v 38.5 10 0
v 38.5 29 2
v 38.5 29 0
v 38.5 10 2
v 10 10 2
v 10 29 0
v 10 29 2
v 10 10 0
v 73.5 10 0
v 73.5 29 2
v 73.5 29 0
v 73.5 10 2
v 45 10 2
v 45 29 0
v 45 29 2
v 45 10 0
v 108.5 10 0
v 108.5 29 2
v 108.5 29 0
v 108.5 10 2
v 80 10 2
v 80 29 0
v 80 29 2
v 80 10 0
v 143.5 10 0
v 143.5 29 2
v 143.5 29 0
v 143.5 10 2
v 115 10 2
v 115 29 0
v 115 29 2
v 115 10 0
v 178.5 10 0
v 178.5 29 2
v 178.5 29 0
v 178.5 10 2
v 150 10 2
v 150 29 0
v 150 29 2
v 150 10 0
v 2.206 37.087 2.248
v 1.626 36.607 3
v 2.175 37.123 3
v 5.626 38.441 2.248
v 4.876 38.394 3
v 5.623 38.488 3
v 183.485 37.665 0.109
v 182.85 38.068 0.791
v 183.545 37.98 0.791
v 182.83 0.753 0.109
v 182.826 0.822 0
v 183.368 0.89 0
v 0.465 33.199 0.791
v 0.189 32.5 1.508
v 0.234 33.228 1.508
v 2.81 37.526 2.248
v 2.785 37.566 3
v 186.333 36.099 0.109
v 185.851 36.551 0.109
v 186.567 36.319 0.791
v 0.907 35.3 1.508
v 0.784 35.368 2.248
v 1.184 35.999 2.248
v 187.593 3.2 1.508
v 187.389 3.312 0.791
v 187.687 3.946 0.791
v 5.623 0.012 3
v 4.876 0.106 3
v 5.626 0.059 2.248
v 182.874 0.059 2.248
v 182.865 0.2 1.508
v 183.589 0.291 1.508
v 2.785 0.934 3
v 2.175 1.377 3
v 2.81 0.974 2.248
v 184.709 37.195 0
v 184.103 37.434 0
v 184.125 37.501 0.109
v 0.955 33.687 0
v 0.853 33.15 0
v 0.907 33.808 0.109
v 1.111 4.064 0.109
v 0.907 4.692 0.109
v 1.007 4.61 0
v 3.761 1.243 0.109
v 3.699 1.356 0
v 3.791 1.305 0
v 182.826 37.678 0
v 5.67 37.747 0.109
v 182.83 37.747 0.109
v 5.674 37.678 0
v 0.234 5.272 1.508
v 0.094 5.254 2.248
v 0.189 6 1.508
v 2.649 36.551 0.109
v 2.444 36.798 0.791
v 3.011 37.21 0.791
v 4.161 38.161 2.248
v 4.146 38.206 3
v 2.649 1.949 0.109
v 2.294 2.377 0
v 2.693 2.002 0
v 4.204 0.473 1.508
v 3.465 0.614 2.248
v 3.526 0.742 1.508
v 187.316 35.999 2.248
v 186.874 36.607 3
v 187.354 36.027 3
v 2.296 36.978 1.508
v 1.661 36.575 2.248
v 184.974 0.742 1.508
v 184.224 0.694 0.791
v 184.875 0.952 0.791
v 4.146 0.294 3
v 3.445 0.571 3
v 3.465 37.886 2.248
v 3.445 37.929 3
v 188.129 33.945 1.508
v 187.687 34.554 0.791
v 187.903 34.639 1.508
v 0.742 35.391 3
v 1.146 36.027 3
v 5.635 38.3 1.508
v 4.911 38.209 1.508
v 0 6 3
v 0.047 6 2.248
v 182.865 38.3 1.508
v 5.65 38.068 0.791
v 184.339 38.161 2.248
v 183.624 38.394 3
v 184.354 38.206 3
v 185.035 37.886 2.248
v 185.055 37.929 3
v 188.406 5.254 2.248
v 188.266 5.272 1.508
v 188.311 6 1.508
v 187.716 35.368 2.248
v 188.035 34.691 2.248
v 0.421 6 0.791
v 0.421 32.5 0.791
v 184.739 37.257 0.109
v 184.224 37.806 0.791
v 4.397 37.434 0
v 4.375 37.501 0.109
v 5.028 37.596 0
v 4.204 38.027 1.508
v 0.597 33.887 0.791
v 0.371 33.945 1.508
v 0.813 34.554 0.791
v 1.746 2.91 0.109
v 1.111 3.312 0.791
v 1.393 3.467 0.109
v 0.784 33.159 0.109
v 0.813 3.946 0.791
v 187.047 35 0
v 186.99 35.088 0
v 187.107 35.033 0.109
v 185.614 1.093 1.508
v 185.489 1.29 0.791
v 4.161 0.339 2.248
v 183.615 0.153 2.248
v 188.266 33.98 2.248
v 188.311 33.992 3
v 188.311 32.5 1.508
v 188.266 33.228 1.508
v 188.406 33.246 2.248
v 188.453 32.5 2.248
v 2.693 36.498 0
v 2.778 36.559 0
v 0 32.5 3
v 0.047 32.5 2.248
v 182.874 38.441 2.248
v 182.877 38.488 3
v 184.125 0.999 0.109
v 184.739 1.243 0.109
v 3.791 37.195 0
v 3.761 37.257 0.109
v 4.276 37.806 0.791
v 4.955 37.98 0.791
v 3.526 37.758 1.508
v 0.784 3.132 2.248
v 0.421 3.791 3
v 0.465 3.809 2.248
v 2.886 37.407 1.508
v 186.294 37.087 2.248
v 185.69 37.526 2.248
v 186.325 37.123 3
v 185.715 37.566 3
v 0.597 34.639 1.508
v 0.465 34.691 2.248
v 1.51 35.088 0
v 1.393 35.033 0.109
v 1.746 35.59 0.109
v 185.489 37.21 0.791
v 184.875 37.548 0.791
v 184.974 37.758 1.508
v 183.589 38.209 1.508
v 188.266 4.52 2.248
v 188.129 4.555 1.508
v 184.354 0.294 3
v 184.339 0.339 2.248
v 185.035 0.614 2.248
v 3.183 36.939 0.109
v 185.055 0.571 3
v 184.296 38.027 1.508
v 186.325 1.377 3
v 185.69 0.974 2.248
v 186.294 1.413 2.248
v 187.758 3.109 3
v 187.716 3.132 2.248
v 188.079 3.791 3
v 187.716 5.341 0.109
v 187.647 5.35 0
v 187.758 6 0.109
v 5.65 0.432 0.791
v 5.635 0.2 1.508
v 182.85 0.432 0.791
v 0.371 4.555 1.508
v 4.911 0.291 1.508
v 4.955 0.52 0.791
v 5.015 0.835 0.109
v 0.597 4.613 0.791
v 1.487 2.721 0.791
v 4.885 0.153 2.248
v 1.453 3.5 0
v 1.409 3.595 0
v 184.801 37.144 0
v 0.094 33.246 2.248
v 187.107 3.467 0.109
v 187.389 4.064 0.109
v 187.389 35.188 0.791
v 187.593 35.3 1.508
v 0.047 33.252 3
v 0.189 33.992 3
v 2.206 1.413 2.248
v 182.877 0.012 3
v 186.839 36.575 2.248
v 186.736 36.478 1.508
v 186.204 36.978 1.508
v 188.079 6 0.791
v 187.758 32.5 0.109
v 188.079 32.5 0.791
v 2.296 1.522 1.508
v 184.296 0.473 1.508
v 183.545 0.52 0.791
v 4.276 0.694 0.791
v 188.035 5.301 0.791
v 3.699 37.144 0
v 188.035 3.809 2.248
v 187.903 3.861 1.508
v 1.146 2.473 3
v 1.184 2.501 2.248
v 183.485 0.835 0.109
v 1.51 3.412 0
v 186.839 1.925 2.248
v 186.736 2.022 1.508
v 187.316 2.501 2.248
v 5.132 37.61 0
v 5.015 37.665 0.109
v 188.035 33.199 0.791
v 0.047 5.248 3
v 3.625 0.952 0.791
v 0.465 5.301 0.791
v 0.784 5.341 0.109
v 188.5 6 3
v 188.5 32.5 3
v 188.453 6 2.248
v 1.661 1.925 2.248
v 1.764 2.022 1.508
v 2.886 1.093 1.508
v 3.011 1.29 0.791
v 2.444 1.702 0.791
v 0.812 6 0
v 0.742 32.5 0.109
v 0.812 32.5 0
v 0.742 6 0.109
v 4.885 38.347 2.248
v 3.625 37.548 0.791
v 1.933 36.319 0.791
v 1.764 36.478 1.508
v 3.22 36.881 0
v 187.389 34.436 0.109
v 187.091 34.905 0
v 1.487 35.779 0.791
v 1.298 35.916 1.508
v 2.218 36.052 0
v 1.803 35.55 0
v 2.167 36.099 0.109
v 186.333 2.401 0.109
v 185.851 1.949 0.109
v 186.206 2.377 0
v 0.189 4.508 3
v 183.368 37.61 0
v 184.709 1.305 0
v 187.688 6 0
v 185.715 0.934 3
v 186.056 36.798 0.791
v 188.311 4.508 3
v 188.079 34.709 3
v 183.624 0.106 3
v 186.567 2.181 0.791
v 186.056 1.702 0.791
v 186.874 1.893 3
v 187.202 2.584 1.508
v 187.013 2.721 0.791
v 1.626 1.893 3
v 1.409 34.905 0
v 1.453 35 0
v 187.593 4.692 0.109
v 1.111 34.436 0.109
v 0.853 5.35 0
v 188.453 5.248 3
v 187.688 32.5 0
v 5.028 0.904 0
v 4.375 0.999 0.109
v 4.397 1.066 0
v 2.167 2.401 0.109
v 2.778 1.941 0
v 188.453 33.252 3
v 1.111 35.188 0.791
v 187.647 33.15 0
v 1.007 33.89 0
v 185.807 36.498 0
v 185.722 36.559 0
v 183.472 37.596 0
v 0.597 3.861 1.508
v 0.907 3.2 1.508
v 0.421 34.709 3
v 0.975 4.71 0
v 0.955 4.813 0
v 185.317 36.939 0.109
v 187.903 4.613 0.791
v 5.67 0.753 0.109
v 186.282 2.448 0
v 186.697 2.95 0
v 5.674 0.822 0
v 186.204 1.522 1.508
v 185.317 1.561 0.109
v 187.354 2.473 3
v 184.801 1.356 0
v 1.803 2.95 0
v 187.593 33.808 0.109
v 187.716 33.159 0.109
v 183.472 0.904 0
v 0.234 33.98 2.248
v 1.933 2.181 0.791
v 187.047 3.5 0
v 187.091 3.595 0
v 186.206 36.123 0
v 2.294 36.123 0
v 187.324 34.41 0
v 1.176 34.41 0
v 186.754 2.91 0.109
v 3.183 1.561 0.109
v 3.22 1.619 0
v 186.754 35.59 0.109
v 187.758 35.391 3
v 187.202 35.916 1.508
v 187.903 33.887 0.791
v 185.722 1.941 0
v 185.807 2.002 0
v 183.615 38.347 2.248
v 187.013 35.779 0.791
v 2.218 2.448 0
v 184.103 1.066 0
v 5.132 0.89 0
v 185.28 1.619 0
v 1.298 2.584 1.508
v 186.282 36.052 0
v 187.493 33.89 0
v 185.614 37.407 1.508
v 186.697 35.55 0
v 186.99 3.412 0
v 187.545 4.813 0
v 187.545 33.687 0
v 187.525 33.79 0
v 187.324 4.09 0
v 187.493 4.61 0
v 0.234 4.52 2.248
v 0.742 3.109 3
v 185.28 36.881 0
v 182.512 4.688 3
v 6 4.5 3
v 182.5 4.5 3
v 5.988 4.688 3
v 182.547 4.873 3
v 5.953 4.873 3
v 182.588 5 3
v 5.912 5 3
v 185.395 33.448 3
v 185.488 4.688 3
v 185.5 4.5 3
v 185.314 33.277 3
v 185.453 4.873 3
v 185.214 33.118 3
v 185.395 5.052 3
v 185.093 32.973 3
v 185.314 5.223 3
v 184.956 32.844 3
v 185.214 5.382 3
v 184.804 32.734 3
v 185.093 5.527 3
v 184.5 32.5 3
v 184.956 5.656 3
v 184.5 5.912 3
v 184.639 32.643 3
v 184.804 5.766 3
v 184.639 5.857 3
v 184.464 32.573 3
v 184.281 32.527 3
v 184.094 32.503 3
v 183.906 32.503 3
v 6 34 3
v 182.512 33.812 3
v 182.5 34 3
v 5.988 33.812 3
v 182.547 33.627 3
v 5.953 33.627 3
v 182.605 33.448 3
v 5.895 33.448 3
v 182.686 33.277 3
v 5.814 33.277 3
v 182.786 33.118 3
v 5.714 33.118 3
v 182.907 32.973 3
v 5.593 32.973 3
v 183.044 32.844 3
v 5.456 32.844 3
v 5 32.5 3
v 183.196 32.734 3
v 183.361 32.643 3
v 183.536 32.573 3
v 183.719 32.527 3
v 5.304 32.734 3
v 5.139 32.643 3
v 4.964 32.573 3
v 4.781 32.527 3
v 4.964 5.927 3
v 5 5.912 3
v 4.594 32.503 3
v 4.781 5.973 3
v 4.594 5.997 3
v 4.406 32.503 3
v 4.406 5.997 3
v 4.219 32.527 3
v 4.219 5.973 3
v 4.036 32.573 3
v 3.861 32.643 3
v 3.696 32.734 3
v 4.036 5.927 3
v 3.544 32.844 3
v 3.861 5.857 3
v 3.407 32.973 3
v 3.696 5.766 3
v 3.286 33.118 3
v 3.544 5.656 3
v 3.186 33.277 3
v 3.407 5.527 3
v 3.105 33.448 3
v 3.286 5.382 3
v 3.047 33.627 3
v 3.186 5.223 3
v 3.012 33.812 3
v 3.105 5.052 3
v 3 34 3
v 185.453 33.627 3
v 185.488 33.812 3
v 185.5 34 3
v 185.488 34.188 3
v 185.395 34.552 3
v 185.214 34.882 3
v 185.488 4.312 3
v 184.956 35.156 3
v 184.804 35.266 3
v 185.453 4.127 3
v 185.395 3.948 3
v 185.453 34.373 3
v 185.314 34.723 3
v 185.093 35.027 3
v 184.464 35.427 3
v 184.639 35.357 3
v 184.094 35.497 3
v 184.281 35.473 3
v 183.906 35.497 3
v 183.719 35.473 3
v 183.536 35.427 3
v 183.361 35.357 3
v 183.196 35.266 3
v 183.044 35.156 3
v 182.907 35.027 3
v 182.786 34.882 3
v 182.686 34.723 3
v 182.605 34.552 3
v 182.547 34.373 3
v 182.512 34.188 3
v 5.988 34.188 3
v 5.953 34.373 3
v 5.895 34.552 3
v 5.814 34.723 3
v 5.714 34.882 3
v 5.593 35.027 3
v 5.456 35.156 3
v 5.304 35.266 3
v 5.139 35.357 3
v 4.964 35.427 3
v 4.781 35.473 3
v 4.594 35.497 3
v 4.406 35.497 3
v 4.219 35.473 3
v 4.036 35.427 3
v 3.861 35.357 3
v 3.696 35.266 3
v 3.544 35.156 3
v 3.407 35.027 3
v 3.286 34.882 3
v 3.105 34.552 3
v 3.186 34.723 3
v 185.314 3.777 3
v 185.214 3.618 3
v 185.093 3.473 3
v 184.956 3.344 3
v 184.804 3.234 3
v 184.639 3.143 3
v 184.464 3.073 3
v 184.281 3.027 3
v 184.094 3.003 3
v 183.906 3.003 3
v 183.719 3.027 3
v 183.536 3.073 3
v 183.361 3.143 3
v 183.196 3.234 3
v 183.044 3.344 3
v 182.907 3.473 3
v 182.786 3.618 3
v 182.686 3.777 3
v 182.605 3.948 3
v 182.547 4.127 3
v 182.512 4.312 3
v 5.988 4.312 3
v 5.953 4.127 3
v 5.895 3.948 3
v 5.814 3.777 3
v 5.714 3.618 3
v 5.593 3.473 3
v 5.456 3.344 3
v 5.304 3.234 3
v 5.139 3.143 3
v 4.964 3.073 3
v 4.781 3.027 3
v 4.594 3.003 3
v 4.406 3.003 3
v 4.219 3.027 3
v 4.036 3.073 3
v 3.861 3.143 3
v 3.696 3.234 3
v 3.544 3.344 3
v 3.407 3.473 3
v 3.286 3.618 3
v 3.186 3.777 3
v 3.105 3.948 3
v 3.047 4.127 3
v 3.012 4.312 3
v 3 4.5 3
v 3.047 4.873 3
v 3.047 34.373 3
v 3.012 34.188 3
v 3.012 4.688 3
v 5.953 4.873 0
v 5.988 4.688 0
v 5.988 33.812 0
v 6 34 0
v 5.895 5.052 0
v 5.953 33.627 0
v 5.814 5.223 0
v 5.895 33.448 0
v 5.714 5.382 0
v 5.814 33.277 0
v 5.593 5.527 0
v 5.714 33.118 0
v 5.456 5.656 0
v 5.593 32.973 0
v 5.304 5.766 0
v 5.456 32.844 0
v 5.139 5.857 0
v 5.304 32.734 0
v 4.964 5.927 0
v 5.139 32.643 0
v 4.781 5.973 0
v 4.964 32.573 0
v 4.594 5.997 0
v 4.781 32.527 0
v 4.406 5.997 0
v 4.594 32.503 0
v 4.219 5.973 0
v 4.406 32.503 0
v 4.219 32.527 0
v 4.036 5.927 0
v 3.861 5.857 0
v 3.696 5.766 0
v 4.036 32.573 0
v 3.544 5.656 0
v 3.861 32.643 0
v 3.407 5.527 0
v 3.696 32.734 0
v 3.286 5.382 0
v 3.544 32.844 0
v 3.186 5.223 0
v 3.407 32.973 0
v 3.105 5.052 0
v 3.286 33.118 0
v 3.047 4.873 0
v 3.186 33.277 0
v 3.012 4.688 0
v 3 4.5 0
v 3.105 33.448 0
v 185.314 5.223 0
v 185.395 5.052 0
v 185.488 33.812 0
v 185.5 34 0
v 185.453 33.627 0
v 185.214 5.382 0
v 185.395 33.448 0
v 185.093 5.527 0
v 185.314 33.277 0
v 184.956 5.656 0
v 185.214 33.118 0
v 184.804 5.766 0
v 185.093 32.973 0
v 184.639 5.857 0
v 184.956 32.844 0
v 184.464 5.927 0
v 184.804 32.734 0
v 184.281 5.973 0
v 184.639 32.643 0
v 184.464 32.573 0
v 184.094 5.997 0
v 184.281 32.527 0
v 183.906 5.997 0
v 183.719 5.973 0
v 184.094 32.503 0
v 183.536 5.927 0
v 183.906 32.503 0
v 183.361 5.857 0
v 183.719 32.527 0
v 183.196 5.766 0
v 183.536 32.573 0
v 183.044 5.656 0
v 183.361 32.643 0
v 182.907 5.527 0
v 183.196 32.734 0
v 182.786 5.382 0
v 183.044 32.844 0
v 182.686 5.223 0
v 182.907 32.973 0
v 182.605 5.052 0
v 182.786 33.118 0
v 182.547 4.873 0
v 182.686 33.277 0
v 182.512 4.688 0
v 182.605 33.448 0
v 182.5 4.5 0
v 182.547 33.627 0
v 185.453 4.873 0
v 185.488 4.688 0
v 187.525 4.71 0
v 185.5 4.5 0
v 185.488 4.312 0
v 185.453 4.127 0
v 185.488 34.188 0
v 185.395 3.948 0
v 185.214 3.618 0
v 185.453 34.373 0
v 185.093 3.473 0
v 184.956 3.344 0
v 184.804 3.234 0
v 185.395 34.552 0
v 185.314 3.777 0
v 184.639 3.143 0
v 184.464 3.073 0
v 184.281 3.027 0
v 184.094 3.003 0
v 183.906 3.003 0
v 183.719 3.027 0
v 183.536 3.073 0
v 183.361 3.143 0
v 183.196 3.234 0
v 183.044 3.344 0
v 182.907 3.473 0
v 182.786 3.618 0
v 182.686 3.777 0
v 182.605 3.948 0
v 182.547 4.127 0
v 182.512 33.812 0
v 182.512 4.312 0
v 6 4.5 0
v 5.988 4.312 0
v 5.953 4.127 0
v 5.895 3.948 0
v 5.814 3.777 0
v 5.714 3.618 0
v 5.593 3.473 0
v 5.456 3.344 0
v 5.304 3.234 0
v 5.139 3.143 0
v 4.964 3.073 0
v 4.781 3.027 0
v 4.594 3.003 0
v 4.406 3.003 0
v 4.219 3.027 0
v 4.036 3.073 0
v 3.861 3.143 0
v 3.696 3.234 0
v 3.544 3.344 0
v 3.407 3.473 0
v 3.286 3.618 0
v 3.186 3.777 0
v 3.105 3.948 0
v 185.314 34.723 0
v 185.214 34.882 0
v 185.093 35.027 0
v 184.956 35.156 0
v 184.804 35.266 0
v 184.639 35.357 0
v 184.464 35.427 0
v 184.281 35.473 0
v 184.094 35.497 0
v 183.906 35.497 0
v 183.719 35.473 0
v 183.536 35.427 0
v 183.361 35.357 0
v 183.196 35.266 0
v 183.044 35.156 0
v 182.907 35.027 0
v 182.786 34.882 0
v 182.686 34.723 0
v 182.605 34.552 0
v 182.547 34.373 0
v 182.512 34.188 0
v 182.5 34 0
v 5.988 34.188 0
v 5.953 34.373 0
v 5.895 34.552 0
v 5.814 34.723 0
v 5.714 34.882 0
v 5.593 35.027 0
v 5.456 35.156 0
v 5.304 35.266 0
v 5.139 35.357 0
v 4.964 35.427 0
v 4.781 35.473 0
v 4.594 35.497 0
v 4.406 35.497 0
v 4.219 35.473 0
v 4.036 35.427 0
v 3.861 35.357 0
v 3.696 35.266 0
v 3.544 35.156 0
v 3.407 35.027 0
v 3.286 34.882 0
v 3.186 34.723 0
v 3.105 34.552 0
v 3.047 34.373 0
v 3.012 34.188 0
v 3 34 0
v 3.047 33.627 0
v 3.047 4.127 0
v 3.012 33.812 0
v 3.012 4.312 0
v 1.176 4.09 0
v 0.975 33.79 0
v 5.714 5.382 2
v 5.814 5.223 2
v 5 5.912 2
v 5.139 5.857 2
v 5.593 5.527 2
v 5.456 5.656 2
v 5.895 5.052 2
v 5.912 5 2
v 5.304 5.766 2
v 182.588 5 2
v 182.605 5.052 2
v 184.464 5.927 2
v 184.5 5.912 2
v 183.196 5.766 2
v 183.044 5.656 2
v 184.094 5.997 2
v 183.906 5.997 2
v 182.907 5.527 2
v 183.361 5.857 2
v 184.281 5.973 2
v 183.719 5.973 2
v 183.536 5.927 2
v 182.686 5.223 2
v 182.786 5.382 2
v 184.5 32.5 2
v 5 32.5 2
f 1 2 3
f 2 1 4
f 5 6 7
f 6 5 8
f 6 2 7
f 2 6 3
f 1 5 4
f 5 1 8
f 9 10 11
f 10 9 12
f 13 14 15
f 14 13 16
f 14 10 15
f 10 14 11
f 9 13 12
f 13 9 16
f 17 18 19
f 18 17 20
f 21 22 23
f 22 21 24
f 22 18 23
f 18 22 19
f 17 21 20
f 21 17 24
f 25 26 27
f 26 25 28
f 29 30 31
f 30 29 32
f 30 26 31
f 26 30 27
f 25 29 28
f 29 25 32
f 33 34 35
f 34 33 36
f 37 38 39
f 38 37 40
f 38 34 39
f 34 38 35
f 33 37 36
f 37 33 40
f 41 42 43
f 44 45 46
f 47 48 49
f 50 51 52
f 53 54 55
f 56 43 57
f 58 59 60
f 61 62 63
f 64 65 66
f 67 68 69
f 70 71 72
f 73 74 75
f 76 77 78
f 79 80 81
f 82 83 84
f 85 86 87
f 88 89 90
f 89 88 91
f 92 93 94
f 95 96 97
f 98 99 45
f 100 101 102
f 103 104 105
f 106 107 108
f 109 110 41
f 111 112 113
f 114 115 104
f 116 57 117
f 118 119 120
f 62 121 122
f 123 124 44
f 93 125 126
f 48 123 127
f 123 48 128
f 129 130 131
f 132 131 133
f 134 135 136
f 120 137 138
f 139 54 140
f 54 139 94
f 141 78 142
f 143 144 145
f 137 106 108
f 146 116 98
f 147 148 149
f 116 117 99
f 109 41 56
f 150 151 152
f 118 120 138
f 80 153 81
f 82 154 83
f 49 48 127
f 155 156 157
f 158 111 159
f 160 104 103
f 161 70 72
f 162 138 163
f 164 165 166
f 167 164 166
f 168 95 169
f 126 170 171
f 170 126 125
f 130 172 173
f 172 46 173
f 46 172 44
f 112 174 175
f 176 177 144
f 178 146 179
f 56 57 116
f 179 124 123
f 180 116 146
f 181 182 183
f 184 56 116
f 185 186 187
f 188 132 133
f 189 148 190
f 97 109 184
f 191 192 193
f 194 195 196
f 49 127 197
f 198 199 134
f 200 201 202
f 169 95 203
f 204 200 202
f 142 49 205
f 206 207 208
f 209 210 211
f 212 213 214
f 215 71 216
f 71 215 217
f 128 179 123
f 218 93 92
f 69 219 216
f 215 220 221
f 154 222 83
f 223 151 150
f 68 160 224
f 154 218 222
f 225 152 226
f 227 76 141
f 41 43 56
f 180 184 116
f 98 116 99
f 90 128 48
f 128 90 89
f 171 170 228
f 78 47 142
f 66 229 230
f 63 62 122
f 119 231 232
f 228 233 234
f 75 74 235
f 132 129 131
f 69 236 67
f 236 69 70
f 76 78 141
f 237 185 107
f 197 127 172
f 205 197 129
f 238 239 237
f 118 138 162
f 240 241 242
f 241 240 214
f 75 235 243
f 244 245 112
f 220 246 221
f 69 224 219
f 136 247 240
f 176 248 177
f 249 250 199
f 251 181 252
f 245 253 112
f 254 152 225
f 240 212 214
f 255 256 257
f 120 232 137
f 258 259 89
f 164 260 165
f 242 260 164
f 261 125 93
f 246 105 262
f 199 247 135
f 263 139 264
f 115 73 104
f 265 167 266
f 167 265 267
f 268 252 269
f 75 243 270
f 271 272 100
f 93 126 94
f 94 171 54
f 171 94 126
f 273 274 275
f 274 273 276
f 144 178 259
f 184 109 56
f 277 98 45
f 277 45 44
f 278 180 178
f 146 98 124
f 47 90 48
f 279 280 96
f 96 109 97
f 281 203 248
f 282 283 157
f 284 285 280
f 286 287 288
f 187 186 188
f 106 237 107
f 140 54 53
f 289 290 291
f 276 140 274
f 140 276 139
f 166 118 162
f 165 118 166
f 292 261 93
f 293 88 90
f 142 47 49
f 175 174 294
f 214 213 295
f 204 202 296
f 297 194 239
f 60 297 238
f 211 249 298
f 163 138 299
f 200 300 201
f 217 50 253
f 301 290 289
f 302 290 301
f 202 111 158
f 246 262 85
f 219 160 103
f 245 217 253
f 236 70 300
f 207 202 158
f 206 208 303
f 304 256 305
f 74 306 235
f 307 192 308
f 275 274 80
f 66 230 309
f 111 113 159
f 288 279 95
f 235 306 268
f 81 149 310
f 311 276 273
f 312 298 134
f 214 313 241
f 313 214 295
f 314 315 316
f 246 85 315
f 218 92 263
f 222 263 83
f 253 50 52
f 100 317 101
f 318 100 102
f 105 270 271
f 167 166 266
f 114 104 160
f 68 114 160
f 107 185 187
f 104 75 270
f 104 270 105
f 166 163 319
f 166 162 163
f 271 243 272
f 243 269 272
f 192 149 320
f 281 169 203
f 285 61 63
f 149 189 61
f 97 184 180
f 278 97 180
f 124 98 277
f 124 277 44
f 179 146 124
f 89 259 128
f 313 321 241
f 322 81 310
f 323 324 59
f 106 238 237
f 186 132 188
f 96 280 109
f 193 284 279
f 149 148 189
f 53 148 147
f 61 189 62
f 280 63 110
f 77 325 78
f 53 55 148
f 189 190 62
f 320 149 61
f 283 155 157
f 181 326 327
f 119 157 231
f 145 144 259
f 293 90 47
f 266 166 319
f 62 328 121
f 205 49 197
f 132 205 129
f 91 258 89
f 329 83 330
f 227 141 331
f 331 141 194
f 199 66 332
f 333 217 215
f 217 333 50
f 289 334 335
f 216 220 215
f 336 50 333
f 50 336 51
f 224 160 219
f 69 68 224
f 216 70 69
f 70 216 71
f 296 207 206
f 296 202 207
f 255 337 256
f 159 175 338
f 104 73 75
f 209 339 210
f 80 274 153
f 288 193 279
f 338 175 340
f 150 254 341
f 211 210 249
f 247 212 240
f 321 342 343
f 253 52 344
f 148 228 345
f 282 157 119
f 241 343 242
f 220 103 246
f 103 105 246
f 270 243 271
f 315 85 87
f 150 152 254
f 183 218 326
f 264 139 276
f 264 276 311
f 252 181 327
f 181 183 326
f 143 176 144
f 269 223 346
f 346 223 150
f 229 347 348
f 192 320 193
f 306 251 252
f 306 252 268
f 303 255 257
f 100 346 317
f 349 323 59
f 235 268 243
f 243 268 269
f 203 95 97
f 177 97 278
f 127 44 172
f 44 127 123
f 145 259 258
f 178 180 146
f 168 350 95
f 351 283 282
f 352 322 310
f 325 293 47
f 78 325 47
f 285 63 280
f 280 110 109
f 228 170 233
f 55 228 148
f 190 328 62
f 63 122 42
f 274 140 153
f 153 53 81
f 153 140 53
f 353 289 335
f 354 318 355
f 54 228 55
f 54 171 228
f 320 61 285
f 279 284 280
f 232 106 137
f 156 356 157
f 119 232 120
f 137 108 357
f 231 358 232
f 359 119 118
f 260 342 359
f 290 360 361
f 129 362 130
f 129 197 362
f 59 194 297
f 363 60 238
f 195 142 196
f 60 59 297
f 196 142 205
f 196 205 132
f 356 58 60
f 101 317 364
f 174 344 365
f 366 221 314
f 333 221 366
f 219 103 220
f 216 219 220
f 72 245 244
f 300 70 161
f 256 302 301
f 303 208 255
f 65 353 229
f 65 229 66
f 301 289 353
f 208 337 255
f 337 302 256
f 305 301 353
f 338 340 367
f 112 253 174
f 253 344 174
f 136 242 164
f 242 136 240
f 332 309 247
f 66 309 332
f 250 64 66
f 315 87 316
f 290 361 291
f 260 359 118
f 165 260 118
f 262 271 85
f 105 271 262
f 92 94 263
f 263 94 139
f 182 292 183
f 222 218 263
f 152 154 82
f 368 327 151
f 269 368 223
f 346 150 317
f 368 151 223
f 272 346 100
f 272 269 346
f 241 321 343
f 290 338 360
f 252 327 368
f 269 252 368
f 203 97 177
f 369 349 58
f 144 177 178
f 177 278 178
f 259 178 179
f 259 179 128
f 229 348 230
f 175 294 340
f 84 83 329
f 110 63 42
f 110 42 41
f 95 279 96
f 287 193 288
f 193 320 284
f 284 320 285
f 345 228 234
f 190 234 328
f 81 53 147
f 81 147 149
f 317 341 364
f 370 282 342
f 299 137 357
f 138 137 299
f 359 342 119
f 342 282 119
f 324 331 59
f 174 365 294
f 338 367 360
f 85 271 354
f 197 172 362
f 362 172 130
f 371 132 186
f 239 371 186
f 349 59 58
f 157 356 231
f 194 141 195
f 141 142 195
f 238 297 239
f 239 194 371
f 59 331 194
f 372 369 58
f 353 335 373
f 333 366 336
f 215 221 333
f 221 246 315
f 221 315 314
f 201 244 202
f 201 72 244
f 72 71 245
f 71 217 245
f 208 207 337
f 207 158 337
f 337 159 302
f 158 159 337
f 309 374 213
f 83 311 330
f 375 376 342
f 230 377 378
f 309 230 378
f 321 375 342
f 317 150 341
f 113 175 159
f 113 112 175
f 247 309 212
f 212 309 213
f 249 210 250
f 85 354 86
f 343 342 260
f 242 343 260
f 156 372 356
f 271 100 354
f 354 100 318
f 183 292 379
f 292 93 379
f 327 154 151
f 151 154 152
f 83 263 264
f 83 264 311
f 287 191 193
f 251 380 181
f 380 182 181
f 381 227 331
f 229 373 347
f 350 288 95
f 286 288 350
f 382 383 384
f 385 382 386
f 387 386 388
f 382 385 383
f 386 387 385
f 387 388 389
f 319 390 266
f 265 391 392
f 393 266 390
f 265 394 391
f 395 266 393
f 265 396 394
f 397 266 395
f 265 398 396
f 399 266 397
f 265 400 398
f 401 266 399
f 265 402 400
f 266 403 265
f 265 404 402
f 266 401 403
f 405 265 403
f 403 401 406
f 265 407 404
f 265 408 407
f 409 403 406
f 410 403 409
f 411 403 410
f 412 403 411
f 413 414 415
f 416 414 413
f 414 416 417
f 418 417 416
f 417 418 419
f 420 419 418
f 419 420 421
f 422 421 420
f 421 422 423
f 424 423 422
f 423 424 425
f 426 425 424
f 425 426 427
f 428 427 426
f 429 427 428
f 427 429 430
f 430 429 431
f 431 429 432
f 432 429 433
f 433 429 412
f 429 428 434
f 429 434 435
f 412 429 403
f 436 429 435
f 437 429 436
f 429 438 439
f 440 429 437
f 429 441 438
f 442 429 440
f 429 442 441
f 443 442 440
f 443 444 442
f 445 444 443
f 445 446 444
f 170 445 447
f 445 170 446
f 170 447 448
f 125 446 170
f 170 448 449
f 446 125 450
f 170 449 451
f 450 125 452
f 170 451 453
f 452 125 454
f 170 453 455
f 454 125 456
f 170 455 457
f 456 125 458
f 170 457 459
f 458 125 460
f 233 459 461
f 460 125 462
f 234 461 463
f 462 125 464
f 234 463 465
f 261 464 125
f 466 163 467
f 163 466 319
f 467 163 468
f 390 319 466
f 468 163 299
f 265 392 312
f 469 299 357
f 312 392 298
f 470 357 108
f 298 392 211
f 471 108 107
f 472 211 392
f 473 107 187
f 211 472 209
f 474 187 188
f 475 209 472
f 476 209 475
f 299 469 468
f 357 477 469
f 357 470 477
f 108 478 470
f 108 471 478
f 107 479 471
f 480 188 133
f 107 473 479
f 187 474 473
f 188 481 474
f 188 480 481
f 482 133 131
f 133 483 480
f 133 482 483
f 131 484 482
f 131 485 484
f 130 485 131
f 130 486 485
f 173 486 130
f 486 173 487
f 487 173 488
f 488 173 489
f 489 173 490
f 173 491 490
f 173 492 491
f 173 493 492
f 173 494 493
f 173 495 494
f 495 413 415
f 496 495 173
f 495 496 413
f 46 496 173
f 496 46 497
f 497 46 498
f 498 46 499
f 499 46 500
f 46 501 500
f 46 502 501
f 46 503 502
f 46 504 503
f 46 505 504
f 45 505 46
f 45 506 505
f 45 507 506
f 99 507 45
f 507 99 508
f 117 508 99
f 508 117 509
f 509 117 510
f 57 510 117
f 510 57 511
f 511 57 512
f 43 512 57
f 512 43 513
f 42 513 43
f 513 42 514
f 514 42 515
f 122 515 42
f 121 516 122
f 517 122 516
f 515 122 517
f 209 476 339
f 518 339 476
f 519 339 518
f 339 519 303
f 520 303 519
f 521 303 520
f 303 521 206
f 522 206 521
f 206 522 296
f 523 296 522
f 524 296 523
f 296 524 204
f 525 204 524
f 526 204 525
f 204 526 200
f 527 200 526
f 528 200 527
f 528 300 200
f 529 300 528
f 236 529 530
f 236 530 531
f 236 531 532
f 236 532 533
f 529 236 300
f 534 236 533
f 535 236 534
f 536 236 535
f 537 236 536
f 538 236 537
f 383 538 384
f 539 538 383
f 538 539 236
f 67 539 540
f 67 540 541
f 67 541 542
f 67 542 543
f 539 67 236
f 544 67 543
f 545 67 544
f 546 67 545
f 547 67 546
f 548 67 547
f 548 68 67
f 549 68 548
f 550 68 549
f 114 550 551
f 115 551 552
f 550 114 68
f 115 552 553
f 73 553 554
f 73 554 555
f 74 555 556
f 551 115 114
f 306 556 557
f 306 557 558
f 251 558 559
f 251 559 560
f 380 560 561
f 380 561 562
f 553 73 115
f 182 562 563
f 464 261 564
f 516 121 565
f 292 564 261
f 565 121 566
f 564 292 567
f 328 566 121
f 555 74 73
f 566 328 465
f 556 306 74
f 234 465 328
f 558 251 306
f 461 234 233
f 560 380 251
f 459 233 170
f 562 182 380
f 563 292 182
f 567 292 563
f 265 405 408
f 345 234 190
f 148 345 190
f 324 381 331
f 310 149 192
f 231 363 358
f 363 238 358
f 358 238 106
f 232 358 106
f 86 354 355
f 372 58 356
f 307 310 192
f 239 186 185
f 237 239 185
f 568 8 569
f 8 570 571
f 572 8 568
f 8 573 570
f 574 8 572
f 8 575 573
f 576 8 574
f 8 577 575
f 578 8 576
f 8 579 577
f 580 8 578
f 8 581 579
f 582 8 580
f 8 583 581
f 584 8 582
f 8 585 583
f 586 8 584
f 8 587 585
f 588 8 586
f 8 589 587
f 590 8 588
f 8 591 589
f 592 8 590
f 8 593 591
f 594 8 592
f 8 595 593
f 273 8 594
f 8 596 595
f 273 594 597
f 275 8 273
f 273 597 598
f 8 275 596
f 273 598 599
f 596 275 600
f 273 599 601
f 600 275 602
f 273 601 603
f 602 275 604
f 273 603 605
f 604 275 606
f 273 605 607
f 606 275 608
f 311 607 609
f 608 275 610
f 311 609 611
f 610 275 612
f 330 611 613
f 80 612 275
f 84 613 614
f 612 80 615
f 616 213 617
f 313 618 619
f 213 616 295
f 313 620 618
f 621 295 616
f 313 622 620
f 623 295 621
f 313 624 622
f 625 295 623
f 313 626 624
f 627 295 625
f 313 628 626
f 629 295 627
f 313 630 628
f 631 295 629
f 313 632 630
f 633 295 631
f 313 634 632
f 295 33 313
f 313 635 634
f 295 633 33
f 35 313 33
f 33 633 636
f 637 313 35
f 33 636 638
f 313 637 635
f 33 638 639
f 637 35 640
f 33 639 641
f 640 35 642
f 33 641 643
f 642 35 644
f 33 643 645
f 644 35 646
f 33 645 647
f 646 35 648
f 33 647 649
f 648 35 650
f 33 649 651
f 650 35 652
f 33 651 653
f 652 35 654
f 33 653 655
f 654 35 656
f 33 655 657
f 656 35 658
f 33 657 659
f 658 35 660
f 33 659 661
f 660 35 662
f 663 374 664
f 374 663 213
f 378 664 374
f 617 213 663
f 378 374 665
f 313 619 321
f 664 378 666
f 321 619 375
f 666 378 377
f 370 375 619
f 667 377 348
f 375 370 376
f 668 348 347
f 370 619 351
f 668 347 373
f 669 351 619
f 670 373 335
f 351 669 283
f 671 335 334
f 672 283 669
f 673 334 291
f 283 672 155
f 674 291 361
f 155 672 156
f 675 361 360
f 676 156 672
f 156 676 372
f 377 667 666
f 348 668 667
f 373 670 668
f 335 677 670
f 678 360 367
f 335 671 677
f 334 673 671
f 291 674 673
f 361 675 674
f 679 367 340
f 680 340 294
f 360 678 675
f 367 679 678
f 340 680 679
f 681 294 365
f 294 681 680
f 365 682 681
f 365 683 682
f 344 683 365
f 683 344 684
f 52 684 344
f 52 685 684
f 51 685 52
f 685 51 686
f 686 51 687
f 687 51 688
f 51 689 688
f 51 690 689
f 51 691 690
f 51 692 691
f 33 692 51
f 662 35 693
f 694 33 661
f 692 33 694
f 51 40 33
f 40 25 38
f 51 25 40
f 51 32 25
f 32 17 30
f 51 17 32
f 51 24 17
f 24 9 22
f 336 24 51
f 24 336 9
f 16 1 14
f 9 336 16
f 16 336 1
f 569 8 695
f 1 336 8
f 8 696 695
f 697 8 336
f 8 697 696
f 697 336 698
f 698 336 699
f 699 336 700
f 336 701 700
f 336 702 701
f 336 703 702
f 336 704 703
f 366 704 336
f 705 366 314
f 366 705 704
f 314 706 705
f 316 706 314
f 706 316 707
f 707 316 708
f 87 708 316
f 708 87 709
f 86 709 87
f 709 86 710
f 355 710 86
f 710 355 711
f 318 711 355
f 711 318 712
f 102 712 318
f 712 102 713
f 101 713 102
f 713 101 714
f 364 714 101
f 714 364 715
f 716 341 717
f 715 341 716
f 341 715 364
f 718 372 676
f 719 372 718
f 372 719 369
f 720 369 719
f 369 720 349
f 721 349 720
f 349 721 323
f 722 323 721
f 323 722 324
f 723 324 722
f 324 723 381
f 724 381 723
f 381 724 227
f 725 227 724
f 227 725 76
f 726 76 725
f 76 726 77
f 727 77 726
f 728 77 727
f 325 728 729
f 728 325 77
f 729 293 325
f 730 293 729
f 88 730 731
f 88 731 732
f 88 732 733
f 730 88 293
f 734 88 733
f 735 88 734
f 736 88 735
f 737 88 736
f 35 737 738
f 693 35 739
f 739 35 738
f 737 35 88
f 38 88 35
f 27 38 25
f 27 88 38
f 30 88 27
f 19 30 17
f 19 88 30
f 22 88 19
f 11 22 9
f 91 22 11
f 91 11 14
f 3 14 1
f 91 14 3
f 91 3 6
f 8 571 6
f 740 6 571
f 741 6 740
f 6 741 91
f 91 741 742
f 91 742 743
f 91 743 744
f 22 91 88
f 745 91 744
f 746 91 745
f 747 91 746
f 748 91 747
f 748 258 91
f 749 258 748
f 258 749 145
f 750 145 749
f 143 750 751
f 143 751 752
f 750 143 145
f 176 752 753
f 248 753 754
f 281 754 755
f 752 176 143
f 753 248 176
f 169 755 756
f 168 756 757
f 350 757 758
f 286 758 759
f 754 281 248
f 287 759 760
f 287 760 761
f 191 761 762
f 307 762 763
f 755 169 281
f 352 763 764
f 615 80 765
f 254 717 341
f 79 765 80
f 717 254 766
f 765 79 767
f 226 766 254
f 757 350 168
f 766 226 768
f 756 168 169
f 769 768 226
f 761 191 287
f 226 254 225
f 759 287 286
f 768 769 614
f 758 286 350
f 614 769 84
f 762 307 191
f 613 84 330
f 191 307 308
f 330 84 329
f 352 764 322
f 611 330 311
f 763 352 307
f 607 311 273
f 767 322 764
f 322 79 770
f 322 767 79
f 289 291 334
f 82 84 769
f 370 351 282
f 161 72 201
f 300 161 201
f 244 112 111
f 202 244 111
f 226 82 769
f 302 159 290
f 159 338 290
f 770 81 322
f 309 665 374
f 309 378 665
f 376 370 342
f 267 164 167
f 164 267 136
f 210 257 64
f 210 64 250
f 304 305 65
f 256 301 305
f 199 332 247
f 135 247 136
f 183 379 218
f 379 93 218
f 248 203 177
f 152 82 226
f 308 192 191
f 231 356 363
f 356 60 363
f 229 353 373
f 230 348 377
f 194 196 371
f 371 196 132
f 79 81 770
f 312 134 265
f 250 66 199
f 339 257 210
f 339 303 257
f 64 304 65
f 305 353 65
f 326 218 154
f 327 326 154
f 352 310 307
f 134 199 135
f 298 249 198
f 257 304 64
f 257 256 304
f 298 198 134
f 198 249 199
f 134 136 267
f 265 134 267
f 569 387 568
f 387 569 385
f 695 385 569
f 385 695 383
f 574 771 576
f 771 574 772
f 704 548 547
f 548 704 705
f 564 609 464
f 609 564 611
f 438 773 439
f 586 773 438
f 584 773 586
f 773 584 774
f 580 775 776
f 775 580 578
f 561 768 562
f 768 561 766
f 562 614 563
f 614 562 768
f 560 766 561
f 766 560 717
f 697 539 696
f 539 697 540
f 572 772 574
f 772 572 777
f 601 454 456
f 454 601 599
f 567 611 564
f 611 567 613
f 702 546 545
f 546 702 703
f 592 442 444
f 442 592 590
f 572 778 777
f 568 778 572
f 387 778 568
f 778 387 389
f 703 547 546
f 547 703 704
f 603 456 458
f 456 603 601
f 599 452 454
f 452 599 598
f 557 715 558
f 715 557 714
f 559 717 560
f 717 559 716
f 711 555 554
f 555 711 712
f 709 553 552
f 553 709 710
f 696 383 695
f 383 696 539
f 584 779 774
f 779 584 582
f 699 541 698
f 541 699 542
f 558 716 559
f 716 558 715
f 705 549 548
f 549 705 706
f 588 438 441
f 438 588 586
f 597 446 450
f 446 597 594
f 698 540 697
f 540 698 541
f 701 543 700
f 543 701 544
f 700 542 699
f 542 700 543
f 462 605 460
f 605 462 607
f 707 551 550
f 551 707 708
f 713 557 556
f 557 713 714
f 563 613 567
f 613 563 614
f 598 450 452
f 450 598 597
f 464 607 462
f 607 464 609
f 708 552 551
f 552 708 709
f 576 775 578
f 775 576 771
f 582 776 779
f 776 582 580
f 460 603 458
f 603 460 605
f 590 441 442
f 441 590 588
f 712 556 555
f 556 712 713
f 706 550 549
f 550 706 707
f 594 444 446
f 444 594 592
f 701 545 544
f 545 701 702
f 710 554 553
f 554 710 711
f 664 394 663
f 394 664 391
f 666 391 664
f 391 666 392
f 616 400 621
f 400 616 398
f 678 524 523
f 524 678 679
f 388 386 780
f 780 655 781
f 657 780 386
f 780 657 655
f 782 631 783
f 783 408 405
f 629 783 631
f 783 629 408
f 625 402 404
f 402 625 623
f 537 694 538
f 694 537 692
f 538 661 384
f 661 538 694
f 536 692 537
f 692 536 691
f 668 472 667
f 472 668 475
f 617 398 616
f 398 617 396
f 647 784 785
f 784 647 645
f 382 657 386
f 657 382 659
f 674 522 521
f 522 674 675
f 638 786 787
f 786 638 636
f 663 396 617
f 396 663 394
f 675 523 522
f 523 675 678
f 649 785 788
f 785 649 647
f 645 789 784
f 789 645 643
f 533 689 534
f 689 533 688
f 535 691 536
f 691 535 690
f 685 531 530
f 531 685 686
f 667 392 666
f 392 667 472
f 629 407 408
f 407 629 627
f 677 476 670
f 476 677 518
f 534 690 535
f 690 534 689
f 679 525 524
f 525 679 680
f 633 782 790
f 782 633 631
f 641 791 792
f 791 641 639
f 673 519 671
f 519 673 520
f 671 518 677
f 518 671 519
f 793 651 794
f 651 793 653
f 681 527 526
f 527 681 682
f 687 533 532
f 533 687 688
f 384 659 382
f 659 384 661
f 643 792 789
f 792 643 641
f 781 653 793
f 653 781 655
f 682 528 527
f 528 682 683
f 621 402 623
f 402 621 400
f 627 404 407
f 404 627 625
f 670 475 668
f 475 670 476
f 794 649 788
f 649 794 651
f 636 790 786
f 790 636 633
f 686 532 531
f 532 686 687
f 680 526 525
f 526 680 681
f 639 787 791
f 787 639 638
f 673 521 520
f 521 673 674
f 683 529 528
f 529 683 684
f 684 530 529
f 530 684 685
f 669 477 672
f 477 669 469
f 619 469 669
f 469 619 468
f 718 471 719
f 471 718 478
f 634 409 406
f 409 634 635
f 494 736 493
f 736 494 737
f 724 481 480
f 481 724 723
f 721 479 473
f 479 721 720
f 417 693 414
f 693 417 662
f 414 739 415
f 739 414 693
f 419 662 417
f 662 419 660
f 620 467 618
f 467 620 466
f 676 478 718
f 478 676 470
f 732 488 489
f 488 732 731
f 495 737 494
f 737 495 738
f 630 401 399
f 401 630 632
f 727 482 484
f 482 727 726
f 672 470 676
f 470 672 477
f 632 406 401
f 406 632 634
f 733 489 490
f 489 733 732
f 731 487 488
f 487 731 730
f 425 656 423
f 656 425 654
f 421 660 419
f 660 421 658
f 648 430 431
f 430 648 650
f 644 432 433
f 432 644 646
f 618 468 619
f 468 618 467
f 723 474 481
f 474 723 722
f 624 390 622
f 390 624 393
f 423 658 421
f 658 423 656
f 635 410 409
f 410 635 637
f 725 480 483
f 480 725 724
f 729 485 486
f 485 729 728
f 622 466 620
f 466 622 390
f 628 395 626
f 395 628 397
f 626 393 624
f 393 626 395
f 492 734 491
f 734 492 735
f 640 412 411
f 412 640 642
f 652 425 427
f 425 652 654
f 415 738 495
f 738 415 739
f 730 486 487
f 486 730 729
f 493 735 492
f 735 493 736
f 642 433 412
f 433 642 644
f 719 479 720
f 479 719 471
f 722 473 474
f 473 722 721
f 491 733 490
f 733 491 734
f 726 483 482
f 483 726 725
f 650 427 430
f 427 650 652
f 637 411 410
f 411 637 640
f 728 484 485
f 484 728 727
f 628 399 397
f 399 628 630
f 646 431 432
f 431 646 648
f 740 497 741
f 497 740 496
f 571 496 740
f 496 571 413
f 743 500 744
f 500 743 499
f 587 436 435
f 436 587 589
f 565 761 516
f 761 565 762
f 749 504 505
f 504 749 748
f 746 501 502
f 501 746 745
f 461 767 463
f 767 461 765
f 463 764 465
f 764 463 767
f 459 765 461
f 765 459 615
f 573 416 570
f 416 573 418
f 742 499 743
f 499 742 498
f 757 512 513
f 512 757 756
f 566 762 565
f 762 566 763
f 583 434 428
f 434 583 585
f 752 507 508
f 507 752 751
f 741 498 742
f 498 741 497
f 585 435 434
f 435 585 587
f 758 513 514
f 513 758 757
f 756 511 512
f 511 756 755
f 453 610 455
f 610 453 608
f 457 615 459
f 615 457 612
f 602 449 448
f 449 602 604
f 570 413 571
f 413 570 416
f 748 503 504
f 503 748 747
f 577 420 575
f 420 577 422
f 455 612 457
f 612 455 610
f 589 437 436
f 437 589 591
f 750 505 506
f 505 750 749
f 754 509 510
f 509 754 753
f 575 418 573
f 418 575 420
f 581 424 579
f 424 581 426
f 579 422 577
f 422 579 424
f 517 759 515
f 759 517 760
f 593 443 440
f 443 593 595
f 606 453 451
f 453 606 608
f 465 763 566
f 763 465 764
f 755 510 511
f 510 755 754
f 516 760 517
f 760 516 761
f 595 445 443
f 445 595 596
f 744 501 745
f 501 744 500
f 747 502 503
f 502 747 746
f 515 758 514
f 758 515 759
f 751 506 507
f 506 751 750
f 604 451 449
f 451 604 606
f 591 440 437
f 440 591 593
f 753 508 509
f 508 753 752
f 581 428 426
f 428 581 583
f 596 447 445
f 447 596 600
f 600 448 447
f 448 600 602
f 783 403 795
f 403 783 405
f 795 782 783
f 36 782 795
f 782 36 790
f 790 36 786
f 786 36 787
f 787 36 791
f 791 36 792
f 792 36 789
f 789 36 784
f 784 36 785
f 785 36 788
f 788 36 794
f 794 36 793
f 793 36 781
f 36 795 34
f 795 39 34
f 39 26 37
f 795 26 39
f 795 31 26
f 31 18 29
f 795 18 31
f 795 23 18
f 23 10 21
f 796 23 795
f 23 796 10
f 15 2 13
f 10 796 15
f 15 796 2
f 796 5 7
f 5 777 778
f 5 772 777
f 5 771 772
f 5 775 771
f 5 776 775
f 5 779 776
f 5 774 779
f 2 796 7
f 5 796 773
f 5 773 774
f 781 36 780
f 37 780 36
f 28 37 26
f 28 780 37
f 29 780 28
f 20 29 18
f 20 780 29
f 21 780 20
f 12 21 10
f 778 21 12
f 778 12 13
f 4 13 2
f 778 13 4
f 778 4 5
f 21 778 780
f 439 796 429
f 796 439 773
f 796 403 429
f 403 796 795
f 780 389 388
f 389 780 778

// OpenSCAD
// file: face-plate.scad
module truncated_hemisphere(thickness)
{
	r = 2 * thickness;
	difference() {
		translate(v = [0, 0, thickness])
			sphere(r);
		translate(v = [0, 0, -r])
			cube(size = [2 * r, 2 * r, 2 * r], center = true);
		translate(v = [0, 0, 3 * thickness])
			cube(size = [2 * r, 2 * r, 2 * r], center = true);
	}
}

module face_plate(width, height, thickness)
{
	r = 2 * thickness;
	hull() {
		translate(v = [r, r, 0])
			truncated_hemisphere(r / 2);
		translate(v = [width - r, r, 0])
			truncated_hemisphere(r / 2);
		translate(v = [width - r, height - r, 0])
			truncated_hemisphere(r / 2);
		translate(v = [r, height - r, 0])
			truncated_hemisphere(r / 2);
	}
}
// file: large-switch-array-holder.scad
include <face-plate.scad>

/* This file provides 2 functions meant to be used:

   1. switch_array_holder(rows, cols);
   2. switch_holder_retaining_gasket(rows, cols);

*/


$fn = 50;

clearance = 0.5;
width = 33 + clearance;
height = 23 + clearance;
depth = 10;
outer_width = width + 3;
outer_height = height + 3;
edge_width = 6;

module switch_holder_screw_hole()
{
	translate(v = [0, 0, -1])
		cylinder(r1 = 1.5, r2 = 1.5, h = 10);
}

module switch_holder()
{
	translate(v = [0.5 * outer_width, 0.5 * outer_height, 0.5 * depth])
		difference() {
			cube(size = [outer_width, outer_height, depth], center = true);
			cube(size = [width, height, depth + 5], center = true);
		}
}

module switch_holder_array(r, c)
{
	union() {
		for (i = [0 : 1 : r - 1]) {
			translate(v = [0, (height + 1.5) * i, 0]) {
				for (j = [0 : 1 : c - 1]) {
					translate(v = [(width + 1.5) * j, 0, 0]) {
						switch_holder();
					}
				}
			}
		}
	}
}

module switch_holder_face_plate(r, c)
{
	w = c * (width + 1.5) + 1.5;
	h = r * (height + 1.5) + 1.5;
	thickness = 3;

	difference() {
		face_plate(w + 2 * edge_width, h + 2 * edge_width, 3);
		translate(v = [edge_width, edge_width, -3]) {
			cube(size = [w, h, 10]);
		}
		translate(v = [0.75 * edge_width, 0.75 * edge_width, 0])
			switch_holder_screw_hole();
		translate(v = [w + 1.25 * edge_width, 0.75 * edge_width, 0])
			switch_holder_screw_hole();
		translate(v = [w + 1.25 * edge_width, h + 1.25 * edge_width, 0])
			switch_holder_screw_hole();
		translate(v = [0.75 * edge_width, h + 1.25 * edge_width, 0])
			switch_holder_screw_hole();
	}
}

module switch_array_holder(r, c) {
	union() {
		switch_holder_face_plate(r, c);
		translate(v = [edge_width, edge_width, 0])
			switch_holder_array(r, c);
	}
}

module button_port()
{
	translate(v = [0, 0, -5])
		cube(size = [28.5, 19, 15]);
}

module switch_holder_retaining_gasket(r, c)
{
	w = c * (width + 1.5) + 1.5;
	h = r * (height + 1.5) + 1.5;
	difference() {
		face_plate(w + 2 * edge_width, h + 2 * edge_width, 3);
		translate(v = [edge_width + 4 , edge_width + 4, 0])
		for (i = [0 : 1 : r - 1]) {
			translate(v = [0, (height + 1.5) * i, 0]) {
				for (j = [0 : 1 : c - 1]) {
					translate(v = [(width + 1.5) * j, 0, 0]) {
						button_port();
					}
				}
			}
		}
		translate(v = [0.75 * edge_width, 0.75 * edge_width, 0])
			switch_holder_screw_hole();
		translate(v = [w + 1.25 * edge_width, 0.75 * edge_width, 0])
			switch_holder_screw_hole();
		translate(v = [w + 1.25 * edge_width, h + 1.25 * edge_width, 0])
			switch_holder_screw_hole();
		translate(v = [0.75 * edge_width, h + 1.25 * edge_width, 0])
			switch_holder_screw_hole();
		translate(v = [edge_width - 1, edge_width - 1, 2])
			cube(size = [c * (width + 2) + 2, r * (height + 2) + 2, 20]);
	}
}
/*
switch_array_holder(3, 4);
translate(v = [200, 0, 0])
	switch_holder_retaining_gasket(3, 4);
*/
// main file
rows=1;
cols=5;

include <large-switch-array-holder.scad>

switch_holder_retaining_gasket(rows, cols);
